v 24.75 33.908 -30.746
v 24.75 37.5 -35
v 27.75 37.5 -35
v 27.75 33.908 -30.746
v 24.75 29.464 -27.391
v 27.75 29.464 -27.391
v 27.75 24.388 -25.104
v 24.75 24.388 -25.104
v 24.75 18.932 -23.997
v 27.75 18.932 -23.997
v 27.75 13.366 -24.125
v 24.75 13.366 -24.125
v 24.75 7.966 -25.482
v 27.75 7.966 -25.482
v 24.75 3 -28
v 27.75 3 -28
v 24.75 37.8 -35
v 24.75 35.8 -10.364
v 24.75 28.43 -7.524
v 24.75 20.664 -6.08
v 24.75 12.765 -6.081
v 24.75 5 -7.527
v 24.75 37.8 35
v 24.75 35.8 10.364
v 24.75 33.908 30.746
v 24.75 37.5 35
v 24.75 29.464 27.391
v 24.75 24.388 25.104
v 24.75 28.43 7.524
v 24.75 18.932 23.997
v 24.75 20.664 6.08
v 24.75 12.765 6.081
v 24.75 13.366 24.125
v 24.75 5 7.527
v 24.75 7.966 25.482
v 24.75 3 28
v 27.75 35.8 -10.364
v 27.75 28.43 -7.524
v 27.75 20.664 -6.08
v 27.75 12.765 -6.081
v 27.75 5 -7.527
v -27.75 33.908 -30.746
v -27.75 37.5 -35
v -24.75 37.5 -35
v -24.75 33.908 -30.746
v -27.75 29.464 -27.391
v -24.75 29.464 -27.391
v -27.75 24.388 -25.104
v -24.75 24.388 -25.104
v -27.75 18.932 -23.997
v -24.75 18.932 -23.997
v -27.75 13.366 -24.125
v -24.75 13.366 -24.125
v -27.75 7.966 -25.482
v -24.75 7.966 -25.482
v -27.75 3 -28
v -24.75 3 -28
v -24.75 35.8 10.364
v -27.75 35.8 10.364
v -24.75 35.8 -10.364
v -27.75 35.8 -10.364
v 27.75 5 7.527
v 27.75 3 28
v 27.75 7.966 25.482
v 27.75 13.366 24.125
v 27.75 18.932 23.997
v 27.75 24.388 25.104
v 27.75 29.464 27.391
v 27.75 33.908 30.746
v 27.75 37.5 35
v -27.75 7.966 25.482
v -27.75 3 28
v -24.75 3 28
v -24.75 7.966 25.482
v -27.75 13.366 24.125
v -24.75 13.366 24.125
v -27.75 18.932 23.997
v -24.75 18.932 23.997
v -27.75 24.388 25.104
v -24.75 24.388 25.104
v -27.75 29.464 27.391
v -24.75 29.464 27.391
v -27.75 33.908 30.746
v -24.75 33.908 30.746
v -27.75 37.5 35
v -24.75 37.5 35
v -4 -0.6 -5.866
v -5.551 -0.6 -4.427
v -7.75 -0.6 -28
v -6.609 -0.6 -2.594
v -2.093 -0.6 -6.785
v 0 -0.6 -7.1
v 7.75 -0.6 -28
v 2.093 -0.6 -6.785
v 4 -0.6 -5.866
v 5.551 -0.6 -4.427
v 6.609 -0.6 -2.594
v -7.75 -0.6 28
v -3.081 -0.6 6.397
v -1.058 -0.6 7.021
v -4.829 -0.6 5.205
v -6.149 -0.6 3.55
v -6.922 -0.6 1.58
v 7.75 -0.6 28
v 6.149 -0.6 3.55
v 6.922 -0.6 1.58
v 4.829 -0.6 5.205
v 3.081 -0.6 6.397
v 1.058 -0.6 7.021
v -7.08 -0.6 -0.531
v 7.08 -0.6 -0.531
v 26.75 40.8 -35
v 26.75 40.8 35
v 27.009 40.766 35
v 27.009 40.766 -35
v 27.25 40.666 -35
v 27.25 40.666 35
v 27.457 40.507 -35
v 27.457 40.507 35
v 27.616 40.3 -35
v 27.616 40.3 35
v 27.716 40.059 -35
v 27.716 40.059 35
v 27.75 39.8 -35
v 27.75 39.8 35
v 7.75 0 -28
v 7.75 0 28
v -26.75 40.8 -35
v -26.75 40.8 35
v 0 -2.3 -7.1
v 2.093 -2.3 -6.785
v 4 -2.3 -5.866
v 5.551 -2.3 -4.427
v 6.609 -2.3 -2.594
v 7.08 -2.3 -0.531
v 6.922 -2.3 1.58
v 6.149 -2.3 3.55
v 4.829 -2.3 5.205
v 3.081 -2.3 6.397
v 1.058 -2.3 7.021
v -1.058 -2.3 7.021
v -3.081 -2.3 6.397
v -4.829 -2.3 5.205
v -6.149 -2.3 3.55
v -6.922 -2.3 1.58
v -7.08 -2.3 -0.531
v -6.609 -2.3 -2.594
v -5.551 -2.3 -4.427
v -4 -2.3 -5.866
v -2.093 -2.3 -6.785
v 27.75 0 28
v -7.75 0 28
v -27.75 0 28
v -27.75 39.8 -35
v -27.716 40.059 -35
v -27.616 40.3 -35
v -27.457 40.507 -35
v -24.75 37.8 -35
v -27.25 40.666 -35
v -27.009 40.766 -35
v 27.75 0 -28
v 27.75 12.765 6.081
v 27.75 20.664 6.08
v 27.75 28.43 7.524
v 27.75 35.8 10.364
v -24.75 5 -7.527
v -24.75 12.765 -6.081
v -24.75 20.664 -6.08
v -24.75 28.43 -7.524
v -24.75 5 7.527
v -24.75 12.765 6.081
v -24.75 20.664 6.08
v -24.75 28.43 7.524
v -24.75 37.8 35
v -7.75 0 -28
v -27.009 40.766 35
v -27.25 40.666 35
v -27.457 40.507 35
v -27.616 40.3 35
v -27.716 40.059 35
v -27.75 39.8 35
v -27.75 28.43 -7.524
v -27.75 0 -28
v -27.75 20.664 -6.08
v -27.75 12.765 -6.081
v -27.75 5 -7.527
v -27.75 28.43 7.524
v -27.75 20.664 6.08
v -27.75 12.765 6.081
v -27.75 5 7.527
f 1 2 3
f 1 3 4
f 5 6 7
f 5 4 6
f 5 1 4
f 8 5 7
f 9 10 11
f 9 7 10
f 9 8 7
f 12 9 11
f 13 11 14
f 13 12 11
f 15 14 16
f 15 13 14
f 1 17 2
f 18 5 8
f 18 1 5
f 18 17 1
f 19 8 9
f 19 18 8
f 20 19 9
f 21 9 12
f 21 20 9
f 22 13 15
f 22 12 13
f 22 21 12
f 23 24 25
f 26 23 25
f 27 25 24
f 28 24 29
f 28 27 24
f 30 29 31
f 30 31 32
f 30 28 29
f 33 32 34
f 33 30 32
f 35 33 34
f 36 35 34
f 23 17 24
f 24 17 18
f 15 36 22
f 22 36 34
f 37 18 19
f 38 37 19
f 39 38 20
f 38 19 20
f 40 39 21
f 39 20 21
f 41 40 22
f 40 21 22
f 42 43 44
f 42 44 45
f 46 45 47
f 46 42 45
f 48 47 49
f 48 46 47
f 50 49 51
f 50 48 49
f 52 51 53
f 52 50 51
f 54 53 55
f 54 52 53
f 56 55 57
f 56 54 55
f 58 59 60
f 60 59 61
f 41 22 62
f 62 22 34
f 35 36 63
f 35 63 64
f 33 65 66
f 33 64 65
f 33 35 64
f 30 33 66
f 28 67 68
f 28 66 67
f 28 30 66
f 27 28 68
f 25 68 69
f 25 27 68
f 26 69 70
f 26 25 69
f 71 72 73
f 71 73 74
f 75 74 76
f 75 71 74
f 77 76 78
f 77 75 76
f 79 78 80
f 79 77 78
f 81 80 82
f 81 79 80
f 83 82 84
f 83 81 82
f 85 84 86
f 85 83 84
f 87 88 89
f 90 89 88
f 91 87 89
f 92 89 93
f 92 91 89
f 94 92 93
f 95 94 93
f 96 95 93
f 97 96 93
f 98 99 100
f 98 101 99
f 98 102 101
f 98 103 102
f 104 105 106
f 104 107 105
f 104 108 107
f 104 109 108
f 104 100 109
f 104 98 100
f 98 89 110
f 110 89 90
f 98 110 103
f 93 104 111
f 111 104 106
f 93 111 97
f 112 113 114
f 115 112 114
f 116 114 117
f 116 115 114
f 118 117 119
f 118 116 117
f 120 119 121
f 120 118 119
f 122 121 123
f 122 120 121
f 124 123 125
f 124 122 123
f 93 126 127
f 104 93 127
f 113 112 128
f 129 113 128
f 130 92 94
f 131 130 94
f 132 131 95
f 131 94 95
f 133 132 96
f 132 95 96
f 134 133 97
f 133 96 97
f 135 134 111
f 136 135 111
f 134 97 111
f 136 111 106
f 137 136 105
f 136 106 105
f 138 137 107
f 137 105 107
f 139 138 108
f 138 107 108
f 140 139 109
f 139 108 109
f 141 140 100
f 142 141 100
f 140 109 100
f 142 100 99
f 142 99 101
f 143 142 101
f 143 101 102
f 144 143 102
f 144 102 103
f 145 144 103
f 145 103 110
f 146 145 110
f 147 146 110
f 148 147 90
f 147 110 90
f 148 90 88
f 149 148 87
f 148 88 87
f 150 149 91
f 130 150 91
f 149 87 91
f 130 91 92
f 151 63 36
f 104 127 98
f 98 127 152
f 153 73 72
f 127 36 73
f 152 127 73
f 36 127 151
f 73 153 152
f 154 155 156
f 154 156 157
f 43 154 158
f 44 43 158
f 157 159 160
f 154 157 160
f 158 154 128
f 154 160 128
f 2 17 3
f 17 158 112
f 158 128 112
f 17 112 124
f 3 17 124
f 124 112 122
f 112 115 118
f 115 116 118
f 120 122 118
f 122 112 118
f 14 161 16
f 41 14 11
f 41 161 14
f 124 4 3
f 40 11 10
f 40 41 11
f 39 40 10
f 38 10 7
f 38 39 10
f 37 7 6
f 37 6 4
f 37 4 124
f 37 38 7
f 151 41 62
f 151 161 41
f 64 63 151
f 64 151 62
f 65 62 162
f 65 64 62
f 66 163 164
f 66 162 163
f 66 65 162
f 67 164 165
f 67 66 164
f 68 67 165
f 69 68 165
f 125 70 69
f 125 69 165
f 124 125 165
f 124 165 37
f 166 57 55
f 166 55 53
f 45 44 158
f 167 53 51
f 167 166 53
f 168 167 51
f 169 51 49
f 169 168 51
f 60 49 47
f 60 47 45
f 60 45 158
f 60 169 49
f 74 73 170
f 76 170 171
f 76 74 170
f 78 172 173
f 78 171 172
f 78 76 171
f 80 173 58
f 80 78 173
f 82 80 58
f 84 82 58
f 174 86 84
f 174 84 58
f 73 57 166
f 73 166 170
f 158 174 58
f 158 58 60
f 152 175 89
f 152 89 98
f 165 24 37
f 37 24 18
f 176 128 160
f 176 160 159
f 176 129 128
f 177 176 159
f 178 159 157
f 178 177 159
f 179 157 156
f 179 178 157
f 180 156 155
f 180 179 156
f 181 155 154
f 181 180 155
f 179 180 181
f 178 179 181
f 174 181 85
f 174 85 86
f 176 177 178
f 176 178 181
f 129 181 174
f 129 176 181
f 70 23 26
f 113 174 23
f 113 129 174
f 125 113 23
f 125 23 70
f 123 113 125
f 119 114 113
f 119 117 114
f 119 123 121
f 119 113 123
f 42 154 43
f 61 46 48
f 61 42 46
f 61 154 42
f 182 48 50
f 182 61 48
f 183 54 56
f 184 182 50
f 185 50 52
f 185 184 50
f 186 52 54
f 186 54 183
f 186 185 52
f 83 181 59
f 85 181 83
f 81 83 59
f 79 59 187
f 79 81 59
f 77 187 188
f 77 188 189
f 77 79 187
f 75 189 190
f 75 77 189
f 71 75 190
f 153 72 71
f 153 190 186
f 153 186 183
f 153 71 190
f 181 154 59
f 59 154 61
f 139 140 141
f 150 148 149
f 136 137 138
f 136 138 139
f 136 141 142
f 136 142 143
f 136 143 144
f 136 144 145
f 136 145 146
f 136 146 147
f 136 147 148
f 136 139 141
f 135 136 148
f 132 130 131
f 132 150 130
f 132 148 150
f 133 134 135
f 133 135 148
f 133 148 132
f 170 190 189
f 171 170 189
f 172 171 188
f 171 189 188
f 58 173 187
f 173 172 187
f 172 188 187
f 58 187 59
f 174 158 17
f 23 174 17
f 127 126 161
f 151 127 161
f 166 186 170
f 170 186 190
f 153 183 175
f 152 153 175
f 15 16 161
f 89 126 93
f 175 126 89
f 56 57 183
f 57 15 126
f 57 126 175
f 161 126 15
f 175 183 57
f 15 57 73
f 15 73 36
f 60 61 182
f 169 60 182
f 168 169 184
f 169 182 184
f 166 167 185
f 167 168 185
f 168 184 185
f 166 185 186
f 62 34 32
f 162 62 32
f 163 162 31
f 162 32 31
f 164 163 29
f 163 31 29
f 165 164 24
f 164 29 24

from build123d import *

# Parameters (mm, degrees)
SKETCH1_W               = 55.5
SKETCH1_H               = 56
BOSS_EXTRUDE1_DEPTH     = 3
BOSS_EXTRUDE2_DEPTH     = 28
BOSS_EXTRUDE3_DEPTH     = 35
CUT_EXTRUDE3_DEPTH      = 61.495475037
CUT_EXTRUDE3_DEPTH_BACK = 61.495475037
SKETCH6_W               = 15.5
SKETCH6_H               = 56
BOSS_EXTRUDE4_DEPTH     = 0.6
SKETCH7_R               = 7.1
BOSS_EXTRUDE5_DEPTH     = 1.7
FILLET2_R               = 1


with BuildPart() as part:
    # Sketch1 → Boss-Extrude1 (new body)
    with BuildSketch(Plane(origin=(0, 0, 0), x_dir=(1, 0, 0), z_dir=(0, 1, 0))):
        Rectangle(SKETCH1_W, SKETCH1_H)
    extrude(amount=BOSS_EXTRUDE1_DEPTH)

    # Sketch3 → Boss-Extrude2 (add, symmetric)
    with BuildSketch(Plane.XY):
        Polygon((-27.75, 3), (-27.75, 40.8), (27.75, 40.8), (27.75, 3), (24.75, 3), (24.75, 37.8), (-24.75, 37.8), (-24.75, 3), align=None)
    extrude(amount=BOSS_EXTRUDE2_DEPTH, both=True)

    # Sketch4 → Boss-Extrude3 (add, symmetric)
    with BuildSketch(Plane.XY):
        Polygon((27.75, 40.8), (-27.75, 40.8), (-27.75, 37.5), (-27.75, 3), (-24.75, 3), (-24.75, 37.8), (24.75, 37.8), (24.75, 3), (27.75, 3), (27.75, 37.5), align=None)
    extrude(amount=BOSS_EXTRUDE3_DEPTH, both=True)

    # Sketch5 → Cut-Extrude3 (cut, two sides: drawn at the far end of the back side and taken through both)
    with BuildSketch(Plane(origin=(0, 0, 0), x_dir=(0, 0, -1), z_dir=(1, 0, 0)).offset(-CUT_EXTRUDE3_DEPTH_BACK)):
        with BuildLine():
            Line((-10.364011889, 35.8), (10.364011889, 35.8))
            ThreePointArc((10.364011889, 35.8), (6.080263232, 20.66392266), (7.526937591, 5))
            Line((7.526937591, 5), (-7.526937591, 5))
            ThreePointArc((-7.526937591, 5), (-6.080263232, 20.66392266), (-10.364011889, 35.8))
        make_face()
        with BuildLine():
            Line((-35, 37.5), (-35, 3))
            Line((-35, 3), (-28, 3))
            ThreePointArc((-28, 3), (-24.398228699, 21.690939105), (-35, 37.5))
        make_face()
        with BuildLine():
            Line((28, 3), (35, 3))
            Line((35, 3), (35, 37.5))
            ThreePointArc((35, 37.5), (24.398228699, 21.690939105), (28, 3))
        make_face()
    extrude(amount=CUT_EXTRUDE3_DEPTH + CUT_EXTRUDE3_DEPTH_BACK, mode=Mode.SUBTRACT)

    # Sketch6 → Boss-Extrude4 (add)
    with BuildSketch(Plane.XZ):
        Rectangle(SKETCH6_W, SKETCH6_H)
    extrude(amount=BOSS_EXTRUDE4_DEPTH)

    # Sketch7 → Boss-Extrude5 (add)
    with BuildSketch(Plane.XZ.offset(0.6)):
        with Locations(Location((0, 0, 0), (0, 0, 270))):
            Circle(SKETCH7_R)
    extrude(amount=BOSS_EXTRUDE5_DEPTH)

    # Fillet2
    fillet2_edges = [part.edges().sort_by_distance(p)[0] for p in [
        (27.75, 40.8, 0),
        (-27.75, 40.8, 0),
    ]]
    fillet(fillet2_edges, radius=FILLET2_R)


solid = part.part
